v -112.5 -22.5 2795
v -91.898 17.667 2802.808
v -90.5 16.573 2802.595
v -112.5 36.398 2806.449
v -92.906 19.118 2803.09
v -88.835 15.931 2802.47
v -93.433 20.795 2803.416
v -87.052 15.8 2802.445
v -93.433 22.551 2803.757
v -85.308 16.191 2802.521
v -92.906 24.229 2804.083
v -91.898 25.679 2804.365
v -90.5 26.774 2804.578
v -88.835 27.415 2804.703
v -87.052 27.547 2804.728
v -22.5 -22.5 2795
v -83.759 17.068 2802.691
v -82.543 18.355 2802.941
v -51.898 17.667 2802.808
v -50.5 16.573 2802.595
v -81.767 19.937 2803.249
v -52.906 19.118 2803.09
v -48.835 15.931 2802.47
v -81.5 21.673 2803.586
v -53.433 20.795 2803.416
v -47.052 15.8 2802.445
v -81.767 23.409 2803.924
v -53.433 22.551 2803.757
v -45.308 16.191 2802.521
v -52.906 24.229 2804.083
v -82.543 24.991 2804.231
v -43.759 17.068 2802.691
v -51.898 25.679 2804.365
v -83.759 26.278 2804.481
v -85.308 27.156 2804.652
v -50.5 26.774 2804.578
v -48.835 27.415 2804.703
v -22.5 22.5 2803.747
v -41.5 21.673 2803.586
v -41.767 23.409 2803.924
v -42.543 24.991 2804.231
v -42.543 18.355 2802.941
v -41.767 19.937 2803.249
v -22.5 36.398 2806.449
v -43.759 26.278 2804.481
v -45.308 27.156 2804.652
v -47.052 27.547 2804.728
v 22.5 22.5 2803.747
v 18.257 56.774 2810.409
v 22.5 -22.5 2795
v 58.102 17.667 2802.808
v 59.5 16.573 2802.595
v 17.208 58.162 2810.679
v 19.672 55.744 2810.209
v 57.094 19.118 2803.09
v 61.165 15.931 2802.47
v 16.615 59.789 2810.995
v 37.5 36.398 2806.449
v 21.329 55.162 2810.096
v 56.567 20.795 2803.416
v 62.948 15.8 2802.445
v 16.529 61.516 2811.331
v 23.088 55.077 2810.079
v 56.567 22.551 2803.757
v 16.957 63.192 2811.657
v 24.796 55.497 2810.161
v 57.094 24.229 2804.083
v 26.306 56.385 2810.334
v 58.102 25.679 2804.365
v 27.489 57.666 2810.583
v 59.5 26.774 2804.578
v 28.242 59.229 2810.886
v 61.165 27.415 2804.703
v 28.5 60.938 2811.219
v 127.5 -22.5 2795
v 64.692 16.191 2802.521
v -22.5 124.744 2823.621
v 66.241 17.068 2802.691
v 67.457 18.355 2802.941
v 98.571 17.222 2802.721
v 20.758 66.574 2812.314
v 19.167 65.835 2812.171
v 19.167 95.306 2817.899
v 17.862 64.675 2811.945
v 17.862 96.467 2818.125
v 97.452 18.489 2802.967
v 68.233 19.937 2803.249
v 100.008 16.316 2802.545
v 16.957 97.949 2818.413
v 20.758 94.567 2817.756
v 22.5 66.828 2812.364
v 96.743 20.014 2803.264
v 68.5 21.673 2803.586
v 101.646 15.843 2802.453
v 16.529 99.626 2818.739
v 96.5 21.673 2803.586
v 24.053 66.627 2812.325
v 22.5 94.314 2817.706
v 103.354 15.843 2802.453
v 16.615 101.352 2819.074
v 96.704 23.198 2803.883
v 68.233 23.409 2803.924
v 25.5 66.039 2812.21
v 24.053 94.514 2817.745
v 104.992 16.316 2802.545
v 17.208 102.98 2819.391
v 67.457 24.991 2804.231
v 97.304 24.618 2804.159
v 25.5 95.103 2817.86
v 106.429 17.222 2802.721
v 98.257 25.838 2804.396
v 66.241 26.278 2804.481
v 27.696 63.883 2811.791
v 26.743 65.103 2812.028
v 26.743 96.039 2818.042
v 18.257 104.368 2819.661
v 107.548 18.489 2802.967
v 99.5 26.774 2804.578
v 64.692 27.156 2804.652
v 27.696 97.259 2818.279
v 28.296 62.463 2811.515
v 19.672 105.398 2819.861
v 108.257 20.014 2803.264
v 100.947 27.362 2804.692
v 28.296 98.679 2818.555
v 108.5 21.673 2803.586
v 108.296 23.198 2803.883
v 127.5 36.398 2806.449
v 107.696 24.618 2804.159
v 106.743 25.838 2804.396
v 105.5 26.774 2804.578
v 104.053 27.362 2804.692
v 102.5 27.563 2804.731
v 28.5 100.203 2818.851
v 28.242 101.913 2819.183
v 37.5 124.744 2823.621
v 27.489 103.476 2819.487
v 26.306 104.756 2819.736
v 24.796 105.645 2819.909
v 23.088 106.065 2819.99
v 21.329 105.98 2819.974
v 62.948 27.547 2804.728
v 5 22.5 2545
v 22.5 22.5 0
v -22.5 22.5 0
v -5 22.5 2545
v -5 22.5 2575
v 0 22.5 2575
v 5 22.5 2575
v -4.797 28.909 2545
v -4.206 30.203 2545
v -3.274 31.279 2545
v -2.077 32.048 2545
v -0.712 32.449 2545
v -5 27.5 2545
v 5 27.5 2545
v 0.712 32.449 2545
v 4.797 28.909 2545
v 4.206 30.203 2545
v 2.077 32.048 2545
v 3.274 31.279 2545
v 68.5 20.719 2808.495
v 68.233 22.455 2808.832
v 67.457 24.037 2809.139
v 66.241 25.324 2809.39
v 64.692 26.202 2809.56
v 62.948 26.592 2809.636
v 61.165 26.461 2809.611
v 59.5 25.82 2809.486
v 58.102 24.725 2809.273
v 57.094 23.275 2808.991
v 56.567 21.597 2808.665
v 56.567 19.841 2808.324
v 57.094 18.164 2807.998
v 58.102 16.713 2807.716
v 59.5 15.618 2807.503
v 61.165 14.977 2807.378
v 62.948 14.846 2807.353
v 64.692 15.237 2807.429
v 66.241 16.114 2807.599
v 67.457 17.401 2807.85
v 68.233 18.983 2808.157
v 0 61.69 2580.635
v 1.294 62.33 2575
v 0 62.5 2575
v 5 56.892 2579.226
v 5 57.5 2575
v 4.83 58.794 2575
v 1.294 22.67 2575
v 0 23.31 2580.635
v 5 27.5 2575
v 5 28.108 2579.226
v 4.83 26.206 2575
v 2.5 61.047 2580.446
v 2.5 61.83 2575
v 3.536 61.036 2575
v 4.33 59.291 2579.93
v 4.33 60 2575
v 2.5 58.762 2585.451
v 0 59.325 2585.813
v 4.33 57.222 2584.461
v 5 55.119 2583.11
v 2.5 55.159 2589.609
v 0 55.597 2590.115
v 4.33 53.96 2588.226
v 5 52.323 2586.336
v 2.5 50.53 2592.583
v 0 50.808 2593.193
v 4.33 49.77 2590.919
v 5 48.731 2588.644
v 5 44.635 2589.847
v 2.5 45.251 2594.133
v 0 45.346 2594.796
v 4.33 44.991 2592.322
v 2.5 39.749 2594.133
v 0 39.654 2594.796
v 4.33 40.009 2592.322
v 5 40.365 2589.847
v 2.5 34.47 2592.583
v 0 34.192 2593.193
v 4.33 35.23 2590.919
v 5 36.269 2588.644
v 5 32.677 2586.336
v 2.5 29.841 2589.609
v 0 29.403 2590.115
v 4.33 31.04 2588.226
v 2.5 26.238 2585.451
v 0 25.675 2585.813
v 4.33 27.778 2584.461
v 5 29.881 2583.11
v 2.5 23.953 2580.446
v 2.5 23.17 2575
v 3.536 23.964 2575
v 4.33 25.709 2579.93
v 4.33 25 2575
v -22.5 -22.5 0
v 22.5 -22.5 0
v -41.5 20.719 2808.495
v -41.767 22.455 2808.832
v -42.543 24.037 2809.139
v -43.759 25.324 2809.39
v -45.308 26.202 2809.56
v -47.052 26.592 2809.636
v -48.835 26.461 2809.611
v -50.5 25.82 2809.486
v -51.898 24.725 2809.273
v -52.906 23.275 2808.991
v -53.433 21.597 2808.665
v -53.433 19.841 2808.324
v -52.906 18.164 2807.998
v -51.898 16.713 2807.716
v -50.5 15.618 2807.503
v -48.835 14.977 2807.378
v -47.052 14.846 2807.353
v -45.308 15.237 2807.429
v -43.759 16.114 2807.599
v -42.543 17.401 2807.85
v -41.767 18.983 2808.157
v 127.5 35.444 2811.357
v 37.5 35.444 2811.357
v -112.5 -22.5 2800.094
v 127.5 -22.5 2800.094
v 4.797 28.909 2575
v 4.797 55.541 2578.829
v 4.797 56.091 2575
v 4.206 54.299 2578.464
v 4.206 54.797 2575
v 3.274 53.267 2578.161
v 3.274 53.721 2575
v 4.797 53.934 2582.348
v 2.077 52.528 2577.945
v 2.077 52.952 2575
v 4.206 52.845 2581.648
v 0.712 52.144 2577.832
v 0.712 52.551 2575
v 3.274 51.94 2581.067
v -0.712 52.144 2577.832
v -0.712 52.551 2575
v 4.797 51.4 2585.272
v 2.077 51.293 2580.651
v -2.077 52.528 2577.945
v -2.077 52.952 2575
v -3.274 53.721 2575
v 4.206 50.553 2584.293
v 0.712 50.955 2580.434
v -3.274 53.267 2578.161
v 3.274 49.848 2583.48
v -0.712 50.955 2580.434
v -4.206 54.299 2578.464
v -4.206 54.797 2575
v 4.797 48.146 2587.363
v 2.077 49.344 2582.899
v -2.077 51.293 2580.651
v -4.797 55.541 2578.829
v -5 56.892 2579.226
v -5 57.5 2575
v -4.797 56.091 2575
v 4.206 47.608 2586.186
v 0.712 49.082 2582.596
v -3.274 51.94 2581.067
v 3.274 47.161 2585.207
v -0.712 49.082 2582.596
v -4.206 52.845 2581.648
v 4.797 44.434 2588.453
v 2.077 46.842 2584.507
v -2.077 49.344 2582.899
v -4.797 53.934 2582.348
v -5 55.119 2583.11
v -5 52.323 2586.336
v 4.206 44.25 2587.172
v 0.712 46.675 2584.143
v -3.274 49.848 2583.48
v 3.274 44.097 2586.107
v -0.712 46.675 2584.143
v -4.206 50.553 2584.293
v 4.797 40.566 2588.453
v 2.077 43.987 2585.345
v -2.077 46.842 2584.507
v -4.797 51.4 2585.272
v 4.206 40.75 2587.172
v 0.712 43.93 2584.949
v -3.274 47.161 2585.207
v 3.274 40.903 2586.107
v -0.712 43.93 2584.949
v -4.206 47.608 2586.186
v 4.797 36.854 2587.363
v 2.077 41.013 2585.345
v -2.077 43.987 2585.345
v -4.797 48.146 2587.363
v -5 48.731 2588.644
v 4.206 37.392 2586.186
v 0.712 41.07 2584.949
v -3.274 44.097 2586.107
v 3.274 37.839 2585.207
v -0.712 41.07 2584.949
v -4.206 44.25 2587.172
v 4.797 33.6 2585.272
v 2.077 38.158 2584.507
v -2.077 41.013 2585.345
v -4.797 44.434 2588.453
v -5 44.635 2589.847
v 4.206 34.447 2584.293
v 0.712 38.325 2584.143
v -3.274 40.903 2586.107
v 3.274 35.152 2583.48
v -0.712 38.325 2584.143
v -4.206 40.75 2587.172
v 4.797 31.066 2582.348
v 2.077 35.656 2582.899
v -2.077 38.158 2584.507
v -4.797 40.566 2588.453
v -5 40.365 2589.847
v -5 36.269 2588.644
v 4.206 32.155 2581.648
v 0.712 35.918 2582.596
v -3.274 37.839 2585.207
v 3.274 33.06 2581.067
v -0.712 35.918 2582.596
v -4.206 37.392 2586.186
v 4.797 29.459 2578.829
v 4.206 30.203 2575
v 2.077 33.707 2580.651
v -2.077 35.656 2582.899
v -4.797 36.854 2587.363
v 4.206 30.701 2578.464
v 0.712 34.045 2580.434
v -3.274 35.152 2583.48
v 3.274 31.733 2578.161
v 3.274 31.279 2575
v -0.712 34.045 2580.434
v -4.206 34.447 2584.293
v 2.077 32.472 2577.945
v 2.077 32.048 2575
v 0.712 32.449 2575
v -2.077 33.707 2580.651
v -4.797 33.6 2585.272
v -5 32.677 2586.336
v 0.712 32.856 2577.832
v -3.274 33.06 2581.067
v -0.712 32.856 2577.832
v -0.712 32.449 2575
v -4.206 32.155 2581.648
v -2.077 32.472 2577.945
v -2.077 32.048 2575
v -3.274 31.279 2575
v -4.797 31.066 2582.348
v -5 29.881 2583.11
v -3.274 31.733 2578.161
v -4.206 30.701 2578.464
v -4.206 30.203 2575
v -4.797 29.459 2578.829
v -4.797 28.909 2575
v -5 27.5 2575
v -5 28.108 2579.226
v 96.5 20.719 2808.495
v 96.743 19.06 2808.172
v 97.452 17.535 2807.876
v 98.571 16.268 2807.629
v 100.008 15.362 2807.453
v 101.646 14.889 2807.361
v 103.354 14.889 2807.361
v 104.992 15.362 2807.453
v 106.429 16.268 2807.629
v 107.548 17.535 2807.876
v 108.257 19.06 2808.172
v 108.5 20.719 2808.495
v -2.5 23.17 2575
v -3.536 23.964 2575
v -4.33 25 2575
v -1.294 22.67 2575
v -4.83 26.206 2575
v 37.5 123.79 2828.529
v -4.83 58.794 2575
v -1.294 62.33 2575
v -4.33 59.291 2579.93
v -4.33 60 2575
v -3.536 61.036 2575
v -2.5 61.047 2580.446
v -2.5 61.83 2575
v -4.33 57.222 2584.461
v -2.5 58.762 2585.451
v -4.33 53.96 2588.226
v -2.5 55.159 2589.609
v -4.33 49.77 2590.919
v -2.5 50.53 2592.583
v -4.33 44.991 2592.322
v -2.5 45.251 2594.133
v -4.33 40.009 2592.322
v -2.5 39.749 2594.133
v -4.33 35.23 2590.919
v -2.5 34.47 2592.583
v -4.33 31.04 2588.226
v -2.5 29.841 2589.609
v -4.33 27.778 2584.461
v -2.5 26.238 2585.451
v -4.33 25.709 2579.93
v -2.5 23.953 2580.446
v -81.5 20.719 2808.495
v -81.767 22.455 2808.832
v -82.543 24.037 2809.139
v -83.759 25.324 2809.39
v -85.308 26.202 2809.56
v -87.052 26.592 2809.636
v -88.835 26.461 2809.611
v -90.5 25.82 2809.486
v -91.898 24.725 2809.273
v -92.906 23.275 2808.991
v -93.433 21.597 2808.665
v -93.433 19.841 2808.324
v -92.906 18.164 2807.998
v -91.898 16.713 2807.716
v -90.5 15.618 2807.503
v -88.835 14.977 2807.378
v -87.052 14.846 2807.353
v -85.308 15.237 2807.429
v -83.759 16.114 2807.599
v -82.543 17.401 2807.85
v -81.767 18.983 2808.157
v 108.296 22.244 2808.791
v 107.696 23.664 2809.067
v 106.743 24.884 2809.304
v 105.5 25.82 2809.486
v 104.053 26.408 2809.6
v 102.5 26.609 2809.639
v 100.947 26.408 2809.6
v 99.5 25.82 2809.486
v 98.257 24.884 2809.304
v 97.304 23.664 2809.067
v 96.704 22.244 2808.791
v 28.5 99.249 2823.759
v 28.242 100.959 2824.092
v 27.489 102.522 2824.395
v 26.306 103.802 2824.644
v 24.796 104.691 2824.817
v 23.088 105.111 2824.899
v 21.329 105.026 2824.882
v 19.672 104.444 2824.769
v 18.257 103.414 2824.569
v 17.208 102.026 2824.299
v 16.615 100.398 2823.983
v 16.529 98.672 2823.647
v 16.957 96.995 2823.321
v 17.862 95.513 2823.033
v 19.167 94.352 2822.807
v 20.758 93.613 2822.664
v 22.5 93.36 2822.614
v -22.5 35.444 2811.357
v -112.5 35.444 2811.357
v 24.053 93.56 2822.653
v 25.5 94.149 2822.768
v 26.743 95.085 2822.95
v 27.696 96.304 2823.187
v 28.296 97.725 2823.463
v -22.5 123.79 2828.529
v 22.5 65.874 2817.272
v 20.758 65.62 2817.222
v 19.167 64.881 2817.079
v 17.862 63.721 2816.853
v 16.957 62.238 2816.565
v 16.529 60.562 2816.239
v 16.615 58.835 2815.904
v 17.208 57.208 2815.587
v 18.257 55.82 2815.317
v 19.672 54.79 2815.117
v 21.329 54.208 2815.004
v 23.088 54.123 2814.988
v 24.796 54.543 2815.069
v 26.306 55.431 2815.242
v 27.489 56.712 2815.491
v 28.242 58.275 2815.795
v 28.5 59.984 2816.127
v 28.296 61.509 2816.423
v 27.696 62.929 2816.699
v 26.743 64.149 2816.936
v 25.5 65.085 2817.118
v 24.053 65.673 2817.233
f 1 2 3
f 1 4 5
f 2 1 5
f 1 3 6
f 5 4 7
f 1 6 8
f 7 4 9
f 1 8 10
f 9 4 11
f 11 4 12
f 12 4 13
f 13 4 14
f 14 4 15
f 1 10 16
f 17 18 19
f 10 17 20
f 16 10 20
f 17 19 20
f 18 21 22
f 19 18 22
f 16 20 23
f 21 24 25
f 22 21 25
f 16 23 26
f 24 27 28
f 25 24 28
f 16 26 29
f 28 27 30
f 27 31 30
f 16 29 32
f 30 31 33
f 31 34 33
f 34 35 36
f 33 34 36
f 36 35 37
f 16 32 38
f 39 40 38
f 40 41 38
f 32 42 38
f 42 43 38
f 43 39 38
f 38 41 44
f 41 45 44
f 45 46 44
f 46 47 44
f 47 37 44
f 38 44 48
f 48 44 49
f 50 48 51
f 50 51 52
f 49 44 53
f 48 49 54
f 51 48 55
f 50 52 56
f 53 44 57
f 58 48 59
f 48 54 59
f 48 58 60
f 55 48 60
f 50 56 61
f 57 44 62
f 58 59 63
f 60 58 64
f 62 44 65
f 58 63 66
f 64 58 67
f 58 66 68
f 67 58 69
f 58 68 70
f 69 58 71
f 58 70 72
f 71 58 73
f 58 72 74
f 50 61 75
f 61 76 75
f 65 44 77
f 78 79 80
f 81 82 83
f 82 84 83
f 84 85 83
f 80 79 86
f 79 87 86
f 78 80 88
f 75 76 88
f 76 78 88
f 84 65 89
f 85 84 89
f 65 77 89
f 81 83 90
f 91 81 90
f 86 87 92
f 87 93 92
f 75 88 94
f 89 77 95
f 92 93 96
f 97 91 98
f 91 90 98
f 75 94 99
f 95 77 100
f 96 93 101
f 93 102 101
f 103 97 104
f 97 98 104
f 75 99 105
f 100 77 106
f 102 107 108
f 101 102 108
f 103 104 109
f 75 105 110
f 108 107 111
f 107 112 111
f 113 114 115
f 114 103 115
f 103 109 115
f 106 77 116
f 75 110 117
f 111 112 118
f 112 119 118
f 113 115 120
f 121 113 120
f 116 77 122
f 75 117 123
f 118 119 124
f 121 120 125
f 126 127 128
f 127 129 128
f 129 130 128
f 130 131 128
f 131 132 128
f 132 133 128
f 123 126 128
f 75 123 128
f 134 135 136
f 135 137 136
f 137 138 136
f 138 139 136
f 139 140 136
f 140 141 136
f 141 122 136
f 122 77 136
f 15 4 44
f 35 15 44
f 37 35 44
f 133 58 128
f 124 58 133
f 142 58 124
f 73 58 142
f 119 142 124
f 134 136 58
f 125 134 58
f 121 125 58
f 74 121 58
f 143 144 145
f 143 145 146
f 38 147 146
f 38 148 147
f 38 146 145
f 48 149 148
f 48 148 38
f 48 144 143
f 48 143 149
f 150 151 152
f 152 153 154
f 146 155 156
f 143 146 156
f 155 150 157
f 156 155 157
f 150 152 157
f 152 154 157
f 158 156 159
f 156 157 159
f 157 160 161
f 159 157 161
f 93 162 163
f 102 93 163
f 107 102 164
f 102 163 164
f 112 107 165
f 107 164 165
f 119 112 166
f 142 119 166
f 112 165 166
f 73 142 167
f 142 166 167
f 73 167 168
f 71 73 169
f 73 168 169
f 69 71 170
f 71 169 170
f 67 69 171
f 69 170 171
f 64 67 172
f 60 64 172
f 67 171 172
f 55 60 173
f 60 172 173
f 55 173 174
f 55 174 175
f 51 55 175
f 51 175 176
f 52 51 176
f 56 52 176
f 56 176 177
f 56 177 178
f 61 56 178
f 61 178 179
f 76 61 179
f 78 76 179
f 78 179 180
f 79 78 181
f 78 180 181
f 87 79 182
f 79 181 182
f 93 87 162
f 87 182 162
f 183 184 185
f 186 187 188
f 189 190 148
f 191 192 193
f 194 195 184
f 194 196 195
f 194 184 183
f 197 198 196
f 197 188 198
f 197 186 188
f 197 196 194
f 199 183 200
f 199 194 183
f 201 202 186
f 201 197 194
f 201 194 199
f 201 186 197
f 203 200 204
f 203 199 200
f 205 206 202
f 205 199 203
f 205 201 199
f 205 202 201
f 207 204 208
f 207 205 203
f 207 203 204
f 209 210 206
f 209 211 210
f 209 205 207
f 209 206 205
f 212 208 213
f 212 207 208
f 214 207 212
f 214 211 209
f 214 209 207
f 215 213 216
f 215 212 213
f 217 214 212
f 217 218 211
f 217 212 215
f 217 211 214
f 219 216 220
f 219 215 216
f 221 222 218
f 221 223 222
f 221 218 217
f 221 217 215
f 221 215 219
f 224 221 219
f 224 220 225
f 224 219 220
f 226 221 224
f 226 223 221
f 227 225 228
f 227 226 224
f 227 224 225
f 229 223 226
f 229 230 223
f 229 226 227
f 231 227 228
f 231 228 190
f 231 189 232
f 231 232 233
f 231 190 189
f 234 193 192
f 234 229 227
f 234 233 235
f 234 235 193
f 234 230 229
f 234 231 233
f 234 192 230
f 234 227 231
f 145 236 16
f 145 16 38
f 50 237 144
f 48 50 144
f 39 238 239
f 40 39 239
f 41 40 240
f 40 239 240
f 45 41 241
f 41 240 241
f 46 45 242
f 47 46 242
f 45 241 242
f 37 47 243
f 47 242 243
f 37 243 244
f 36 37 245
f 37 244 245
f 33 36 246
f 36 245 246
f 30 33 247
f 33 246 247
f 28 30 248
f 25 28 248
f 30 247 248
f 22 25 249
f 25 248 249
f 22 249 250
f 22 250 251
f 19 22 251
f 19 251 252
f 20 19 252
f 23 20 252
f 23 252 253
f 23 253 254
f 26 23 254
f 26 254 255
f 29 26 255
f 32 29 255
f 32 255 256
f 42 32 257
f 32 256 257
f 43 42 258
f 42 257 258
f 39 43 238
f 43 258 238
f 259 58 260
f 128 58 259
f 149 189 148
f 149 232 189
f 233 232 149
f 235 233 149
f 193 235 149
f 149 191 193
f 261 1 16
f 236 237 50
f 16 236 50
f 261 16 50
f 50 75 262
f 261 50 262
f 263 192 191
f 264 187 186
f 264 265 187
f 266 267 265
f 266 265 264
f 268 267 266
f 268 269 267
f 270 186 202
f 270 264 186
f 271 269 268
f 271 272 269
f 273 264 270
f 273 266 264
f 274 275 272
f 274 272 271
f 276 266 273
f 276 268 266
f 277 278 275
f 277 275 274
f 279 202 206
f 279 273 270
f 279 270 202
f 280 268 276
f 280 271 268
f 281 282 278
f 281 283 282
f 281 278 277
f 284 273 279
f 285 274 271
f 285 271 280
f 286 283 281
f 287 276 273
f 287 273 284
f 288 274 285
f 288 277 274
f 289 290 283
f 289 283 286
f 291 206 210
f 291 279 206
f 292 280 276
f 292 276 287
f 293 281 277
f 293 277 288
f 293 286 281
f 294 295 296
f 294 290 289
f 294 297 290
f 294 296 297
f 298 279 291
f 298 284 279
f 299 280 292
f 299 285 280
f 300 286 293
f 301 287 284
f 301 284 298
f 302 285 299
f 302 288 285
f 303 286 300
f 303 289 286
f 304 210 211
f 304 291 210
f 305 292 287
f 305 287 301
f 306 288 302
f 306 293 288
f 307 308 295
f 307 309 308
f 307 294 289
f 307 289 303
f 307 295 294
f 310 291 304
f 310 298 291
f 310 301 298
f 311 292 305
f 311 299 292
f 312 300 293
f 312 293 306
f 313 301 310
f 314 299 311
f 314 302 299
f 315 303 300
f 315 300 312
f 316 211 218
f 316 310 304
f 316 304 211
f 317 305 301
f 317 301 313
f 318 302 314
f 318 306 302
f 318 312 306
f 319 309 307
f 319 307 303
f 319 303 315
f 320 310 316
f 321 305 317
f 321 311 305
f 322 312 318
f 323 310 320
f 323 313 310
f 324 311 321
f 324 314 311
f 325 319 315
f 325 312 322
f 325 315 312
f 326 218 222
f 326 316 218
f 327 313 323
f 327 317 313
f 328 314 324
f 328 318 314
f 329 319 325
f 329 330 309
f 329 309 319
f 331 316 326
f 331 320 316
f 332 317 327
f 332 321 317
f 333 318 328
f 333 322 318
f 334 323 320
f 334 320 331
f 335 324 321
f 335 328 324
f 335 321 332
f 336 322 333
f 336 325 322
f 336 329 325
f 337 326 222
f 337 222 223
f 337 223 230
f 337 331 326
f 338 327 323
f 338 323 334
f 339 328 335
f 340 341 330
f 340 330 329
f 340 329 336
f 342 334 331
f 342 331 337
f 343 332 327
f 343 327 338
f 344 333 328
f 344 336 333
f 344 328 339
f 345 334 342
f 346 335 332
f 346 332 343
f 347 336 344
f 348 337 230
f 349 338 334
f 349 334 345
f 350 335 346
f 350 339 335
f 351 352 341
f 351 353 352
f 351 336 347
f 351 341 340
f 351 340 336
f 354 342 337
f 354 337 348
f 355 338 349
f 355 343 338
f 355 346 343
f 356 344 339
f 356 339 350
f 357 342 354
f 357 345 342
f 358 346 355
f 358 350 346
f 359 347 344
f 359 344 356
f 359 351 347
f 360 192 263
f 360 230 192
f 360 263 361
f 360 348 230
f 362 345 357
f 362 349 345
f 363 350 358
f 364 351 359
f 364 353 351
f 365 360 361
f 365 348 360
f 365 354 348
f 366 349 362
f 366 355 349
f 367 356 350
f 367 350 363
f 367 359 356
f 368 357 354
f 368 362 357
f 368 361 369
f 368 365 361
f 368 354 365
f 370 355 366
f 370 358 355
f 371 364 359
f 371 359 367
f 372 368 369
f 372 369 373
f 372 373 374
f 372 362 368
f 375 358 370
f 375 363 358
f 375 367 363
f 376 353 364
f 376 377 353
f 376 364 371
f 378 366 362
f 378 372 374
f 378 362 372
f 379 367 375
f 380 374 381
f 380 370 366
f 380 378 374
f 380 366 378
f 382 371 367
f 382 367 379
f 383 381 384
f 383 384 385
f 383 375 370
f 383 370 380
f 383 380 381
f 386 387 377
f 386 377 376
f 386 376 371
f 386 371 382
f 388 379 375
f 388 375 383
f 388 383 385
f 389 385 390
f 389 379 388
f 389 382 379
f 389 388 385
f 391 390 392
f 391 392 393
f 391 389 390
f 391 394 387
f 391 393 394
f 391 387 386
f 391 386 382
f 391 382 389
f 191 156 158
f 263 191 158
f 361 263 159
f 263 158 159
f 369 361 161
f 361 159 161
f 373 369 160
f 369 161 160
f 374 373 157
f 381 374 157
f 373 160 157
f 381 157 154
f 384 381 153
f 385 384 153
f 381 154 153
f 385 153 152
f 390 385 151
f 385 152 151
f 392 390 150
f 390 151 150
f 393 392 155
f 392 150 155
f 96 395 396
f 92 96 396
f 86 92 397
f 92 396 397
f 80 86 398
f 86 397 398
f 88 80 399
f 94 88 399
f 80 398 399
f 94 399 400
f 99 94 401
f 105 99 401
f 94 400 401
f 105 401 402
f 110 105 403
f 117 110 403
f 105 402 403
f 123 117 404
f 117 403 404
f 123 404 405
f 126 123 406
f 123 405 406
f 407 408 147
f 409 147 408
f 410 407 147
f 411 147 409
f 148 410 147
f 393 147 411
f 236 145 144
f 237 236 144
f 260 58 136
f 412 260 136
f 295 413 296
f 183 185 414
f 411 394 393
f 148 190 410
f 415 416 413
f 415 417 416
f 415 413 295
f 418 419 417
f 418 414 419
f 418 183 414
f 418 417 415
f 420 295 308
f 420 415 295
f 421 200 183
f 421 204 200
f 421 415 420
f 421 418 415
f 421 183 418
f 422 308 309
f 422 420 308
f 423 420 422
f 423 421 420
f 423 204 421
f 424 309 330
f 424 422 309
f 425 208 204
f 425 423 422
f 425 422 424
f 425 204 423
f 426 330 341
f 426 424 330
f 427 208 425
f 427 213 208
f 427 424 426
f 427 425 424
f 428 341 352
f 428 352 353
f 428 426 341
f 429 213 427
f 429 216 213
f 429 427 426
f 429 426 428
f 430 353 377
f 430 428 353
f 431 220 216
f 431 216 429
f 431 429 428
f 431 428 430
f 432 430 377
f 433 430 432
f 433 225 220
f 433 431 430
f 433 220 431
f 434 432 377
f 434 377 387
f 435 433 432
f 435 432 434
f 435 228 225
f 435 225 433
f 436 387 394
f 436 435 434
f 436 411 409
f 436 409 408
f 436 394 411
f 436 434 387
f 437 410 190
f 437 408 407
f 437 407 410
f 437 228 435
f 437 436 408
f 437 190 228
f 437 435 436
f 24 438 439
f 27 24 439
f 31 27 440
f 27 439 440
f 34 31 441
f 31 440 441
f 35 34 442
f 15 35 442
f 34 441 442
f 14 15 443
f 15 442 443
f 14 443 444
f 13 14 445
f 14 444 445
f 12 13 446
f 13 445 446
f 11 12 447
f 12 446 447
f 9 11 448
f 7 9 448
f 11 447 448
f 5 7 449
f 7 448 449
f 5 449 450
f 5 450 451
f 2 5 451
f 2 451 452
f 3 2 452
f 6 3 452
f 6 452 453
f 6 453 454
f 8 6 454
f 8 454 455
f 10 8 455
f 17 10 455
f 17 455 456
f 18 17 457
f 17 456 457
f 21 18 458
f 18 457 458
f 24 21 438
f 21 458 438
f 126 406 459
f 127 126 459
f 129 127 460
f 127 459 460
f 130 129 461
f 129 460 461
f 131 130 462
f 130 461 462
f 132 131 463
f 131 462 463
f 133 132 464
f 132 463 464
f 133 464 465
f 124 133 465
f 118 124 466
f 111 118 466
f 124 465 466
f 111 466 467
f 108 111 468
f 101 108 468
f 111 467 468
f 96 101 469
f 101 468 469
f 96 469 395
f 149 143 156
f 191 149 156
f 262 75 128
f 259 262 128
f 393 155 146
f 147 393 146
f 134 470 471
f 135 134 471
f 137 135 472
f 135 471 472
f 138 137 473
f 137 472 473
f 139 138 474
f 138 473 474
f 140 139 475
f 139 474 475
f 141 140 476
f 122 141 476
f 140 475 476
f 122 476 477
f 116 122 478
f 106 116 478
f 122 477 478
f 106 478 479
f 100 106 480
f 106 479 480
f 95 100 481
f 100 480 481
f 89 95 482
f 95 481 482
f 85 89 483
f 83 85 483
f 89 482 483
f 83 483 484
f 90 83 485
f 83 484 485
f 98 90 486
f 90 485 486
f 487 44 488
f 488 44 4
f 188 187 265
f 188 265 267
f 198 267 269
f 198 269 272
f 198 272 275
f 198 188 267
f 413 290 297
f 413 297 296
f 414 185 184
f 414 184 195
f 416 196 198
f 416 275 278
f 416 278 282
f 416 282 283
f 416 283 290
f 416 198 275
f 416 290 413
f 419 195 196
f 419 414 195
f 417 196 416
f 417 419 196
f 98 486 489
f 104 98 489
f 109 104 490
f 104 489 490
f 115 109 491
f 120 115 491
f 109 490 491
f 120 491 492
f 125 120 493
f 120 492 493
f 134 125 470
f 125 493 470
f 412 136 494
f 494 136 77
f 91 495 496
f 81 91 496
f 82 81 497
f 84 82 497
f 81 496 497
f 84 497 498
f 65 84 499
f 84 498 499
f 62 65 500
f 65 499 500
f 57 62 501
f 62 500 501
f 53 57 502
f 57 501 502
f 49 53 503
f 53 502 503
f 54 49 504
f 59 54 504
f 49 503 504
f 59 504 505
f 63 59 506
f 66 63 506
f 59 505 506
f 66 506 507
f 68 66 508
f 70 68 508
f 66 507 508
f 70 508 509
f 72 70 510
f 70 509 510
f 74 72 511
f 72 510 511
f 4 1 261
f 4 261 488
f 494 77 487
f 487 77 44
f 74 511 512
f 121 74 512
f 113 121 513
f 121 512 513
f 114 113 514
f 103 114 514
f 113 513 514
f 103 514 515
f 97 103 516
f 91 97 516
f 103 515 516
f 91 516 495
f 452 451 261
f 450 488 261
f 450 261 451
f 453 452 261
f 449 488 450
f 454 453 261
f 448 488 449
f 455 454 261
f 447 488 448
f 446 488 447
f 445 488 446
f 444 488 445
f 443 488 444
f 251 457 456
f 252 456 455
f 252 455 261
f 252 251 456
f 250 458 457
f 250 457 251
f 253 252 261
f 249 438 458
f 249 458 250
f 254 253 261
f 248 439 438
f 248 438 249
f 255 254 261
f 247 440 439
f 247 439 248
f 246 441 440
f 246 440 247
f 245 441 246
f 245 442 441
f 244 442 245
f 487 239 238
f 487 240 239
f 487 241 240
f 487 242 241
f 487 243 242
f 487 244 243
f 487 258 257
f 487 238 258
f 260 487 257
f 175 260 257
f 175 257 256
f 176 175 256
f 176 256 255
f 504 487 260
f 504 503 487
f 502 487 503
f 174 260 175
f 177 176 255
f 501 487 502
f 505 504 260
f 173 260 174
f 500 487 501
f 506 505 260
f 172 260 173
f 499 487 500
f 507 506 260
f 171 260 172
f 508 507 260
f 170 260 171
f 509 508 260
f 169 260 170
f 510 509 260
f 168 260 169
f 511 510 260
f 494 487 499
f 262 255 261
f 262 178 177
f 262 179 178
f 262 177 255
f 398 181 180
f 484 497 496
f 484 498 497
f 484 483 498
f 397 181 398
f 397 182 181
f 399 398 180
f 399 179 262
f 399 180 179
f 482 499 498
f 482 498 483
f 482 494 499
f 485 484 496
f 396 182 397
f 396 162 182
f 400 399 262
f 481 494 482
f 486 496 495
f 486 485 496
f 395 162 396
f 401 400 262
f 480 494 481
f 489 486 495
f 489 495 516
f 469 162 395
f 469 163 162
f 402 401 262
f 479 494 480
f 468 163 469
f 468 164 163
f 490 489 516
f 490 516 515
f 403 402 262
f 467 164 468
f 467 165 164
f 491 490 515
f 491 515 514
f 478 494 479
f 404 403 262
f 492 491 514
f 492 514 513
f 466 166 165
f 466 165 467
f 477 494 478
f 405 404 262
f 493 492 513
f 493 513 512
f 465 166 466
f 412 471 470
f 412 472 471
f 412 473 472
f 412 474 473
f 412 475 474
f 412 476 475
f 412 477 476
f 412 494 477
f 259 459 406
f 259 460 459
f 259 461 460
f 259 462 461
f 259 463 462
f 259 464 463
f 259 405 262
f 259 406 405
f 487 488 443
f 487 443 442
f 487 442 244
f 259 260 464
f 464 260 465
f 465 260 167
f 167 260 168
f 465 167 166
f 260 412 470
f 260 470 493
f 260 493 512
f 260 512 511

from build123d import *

# Parameters (mm, degrees)
F0_W          = 45
F0_H          = 45
F1_DEPTH      = 2795
F3_W          = 45
F3_H          = 60
F3_W_2        = 90
F4_DEPTH      = 5
F6_DEPTH      = 45
F8_W          = 2.7798460424
F8_H          = 5.7082939148
F9_DEPTH      = 150
F9_DEPTH_BACK = 90
F10_R         = 6
F11_DEPTH     = 5
F15_DEPTH     = 30


with BuildPart() as f1:
    # F0 (on Top) → F1 (new body)
    with BuildSketch(Plane.XY):
        Rectangle(F0_W, F0_H)
    extrude(amount=F1_DEPTH)


with BuildPart() as f4:
    # F3 (on face) → F4 (new body)
    with BuildSketch(Plane(origin=(0, -524.3318959349, 2697.453760933), x_dir=(1, 0, 0), z_dir=(0, -0.1908089954, 0.9816271834))):
        with Locations((0, 541.2245304499)):
            Rectangle(F3_W, F3_H)
        with Locations((-67.5, 541.2245304499)):
            Rectangle(F3_W_2, F3_H)
        Polygon((22.5, 571.2245304499), (22.5, 511.2245304499), (37.5, 511.2245304499), (37.5, 571.2245304499), (37.5, 661.2245304499), (-22.5, 661.2245304499), (-22.5, 571.2245304499), align=None)
        with Locations((82.5, 541.2245304499)):
            Rectangle(F3_W_2, F3_H)
    extrude(amount=F4_DEPTH)


with BuildPart() as f6:
    # F5 (on face) → F6 (new body)
    with BuildSketch(Plane.YZ.offset(22.5)):
        Polygon((-22.5, 2795), (22.5, 2795), (22.5, 2803.7471139112), align=None)
    extrude(amount=-F6_DEPTH)


with BuildPart() as f1_1:
    add(f1.part)

    # F7: union F6, F4
    add(f6.part)
    add(f4.part)

    # F8 (on face) → F9 (cut, two sides)
    with BuildSketch(Plane(origin=(-22.5, 0, 0), x_dir=(0, -1, 0), z_dir=(-1, 0, 0))) as f9_sk:
        with Locations((23.8899230212, 2797.8541469574)):
            Rectangle(F8_W, F8_H)
    extrude(amount=-F9_DEPTH, mode=Mode.SUBTRACT)
    extrude(f9_sk.sketch, amount=F9_DEPTH_BACK, mode=Mode.SUBTRACT)

    # F10 (on face) → F11 (cut, through all)
    with BuildSketch(Plane(origin=(0, -525.2859409117, 2702.3618968503), x_dir=(1, 0, 0), z_dir=(0, -0.1908089954, 0.9816271834))):
        with BuildLine():
            ThreePointArc((108.5, 556.2245304499), (106.7426406871, 560.467171137), (102.5, 562.2245304499))
            Line((102.5, 562.2245304499), (102.5, 556.2245304499))
            Line((102.5, 556.2245304499), (96.5, 556.2245304499))
            ThreePointArc((96.5, 556.2245304499), (102.5, 550.2245304499), (108.5, 556.2245304499))
        make_face()
        with Locations((62.5, 556.2245304499)):
            Circle(F10_R)
        with BuildLine():
            Line((102.5, 556.2245304499), (102.5, 562.2245304499))
            ThreePointArc((102.5, 562.2245304499), (98.2573593129, 560.467171137), (96.5, 556.2245304499))
            Line((96.5, 556.2245304499), (102.5, 556.2245304499))
        make_face()
        with BuildLine():
            ThreePointArc((22.5, 630.2245304499), (26.7426406871, 631.9818897628), (28.5, 636.2245304499))
            Line((28.5, 636.2245304499), (22.5, 636.2245304499))
            Line((22.5, 636.2245304499), (22.5, 630.2245304499))
        make_face()
        with BuildLine():
            Line((22.5, 636.2245304499), (28.5, 636.2245304499))
            ThreePointArc((28.5, 636.2245304499), (18.2573593129, 640.467171137), (22.5, 630.2245304499))
            Line((22.5, 630.2245304499), (22.5, 636.2245304499))
        make_face()
        with BuildLine():
            ThreePointArc((28.5, 596.2245304499), (26.7426406871, 600.467171137), (22.5, 602.2245304499))
            ThreePointArc((22.5, 602.2245304499), (18.2573593129, 591.9818897628), (28.5, 596.2245304499))
        make_face()
        with Locations((-47.5, 556.2245304499)):
            Circle(F10_R)
        with Locations((-87.5, 556.2245304499)):
            Circle(F10_R)
    extrude(amount=-F11_DEPTH, mode=Mode.SUBTRACT)

    # F14 (on offset) → F15 (join)
    with BuildSketch(Plane.XY.offset(2545)):
        with BuildLine():
            Line((0, 27.5), (5, 27.5))
            ThreePointArc((5, 27.5), (0, 32.5), (-5, 27.5))
            Line((-5, 27.5), (0, 27.5))
        make_face()
        with BuildLine():
            Line((5, 22.5), (5, 27.5))
            ThreePointArc((5, 27.5), (3.5355339059, 23.9644660941), (0, 22.5))
            Line((0, 22.5), (5, 22.5))
        make_face()
        with BuildLine():
            ThreePointArc((0, 22.5), (3.5355339059, 23.9644660941), (5, 27.5))
            Line((5, 27.5), (0, 27.5))
            Line((0, 27.5), (0, 22.5))
        make_face()
        with BuildLine():
            Line((0, 27.5), (-5, 27.5))
            ThreePointArc((-5, 27.5), (-3.5355339059, 23.9644660941), (0, 22.5))
            Line((0, 22.5), (0, 27.5))
        make_face()
        with BuildLine():
            ThreePointArc((0, 22.5), (-3.5355339059, 23.9644660941), (-5, 27.5))
            Line((-5, 27.5), (-5, 22.5))
            Line((-5, 22.5), (0, 22.5))
        make_face()
    extrude(amount=F15_DEPTH)

    # F17: sweep along a path in F13
    with BuildLine(Plane.YZ) as f17_path:
        ThreePointArc((57.5, 2575), (42.5, 2590), (27.5, 2575))
    # F16 (on face) → F17 (sweep)
    with BuildSketch(Plane.XY.offset(2575)):
        with BuildLine():
            ThreePointArc((0, 22.5), (3.5355339059, 23.9644660941), (5, 27.5))
            ThreePointArc((5, 27.5), (0, 32.5), (-5, 27.5))
            ThreePointArc((-5, 27.5), (-3.5355339059, 23.9644660941), (0, 22.5))
        make_face()
    sweep(path=f17_path.line)


solid = f1_1.part
